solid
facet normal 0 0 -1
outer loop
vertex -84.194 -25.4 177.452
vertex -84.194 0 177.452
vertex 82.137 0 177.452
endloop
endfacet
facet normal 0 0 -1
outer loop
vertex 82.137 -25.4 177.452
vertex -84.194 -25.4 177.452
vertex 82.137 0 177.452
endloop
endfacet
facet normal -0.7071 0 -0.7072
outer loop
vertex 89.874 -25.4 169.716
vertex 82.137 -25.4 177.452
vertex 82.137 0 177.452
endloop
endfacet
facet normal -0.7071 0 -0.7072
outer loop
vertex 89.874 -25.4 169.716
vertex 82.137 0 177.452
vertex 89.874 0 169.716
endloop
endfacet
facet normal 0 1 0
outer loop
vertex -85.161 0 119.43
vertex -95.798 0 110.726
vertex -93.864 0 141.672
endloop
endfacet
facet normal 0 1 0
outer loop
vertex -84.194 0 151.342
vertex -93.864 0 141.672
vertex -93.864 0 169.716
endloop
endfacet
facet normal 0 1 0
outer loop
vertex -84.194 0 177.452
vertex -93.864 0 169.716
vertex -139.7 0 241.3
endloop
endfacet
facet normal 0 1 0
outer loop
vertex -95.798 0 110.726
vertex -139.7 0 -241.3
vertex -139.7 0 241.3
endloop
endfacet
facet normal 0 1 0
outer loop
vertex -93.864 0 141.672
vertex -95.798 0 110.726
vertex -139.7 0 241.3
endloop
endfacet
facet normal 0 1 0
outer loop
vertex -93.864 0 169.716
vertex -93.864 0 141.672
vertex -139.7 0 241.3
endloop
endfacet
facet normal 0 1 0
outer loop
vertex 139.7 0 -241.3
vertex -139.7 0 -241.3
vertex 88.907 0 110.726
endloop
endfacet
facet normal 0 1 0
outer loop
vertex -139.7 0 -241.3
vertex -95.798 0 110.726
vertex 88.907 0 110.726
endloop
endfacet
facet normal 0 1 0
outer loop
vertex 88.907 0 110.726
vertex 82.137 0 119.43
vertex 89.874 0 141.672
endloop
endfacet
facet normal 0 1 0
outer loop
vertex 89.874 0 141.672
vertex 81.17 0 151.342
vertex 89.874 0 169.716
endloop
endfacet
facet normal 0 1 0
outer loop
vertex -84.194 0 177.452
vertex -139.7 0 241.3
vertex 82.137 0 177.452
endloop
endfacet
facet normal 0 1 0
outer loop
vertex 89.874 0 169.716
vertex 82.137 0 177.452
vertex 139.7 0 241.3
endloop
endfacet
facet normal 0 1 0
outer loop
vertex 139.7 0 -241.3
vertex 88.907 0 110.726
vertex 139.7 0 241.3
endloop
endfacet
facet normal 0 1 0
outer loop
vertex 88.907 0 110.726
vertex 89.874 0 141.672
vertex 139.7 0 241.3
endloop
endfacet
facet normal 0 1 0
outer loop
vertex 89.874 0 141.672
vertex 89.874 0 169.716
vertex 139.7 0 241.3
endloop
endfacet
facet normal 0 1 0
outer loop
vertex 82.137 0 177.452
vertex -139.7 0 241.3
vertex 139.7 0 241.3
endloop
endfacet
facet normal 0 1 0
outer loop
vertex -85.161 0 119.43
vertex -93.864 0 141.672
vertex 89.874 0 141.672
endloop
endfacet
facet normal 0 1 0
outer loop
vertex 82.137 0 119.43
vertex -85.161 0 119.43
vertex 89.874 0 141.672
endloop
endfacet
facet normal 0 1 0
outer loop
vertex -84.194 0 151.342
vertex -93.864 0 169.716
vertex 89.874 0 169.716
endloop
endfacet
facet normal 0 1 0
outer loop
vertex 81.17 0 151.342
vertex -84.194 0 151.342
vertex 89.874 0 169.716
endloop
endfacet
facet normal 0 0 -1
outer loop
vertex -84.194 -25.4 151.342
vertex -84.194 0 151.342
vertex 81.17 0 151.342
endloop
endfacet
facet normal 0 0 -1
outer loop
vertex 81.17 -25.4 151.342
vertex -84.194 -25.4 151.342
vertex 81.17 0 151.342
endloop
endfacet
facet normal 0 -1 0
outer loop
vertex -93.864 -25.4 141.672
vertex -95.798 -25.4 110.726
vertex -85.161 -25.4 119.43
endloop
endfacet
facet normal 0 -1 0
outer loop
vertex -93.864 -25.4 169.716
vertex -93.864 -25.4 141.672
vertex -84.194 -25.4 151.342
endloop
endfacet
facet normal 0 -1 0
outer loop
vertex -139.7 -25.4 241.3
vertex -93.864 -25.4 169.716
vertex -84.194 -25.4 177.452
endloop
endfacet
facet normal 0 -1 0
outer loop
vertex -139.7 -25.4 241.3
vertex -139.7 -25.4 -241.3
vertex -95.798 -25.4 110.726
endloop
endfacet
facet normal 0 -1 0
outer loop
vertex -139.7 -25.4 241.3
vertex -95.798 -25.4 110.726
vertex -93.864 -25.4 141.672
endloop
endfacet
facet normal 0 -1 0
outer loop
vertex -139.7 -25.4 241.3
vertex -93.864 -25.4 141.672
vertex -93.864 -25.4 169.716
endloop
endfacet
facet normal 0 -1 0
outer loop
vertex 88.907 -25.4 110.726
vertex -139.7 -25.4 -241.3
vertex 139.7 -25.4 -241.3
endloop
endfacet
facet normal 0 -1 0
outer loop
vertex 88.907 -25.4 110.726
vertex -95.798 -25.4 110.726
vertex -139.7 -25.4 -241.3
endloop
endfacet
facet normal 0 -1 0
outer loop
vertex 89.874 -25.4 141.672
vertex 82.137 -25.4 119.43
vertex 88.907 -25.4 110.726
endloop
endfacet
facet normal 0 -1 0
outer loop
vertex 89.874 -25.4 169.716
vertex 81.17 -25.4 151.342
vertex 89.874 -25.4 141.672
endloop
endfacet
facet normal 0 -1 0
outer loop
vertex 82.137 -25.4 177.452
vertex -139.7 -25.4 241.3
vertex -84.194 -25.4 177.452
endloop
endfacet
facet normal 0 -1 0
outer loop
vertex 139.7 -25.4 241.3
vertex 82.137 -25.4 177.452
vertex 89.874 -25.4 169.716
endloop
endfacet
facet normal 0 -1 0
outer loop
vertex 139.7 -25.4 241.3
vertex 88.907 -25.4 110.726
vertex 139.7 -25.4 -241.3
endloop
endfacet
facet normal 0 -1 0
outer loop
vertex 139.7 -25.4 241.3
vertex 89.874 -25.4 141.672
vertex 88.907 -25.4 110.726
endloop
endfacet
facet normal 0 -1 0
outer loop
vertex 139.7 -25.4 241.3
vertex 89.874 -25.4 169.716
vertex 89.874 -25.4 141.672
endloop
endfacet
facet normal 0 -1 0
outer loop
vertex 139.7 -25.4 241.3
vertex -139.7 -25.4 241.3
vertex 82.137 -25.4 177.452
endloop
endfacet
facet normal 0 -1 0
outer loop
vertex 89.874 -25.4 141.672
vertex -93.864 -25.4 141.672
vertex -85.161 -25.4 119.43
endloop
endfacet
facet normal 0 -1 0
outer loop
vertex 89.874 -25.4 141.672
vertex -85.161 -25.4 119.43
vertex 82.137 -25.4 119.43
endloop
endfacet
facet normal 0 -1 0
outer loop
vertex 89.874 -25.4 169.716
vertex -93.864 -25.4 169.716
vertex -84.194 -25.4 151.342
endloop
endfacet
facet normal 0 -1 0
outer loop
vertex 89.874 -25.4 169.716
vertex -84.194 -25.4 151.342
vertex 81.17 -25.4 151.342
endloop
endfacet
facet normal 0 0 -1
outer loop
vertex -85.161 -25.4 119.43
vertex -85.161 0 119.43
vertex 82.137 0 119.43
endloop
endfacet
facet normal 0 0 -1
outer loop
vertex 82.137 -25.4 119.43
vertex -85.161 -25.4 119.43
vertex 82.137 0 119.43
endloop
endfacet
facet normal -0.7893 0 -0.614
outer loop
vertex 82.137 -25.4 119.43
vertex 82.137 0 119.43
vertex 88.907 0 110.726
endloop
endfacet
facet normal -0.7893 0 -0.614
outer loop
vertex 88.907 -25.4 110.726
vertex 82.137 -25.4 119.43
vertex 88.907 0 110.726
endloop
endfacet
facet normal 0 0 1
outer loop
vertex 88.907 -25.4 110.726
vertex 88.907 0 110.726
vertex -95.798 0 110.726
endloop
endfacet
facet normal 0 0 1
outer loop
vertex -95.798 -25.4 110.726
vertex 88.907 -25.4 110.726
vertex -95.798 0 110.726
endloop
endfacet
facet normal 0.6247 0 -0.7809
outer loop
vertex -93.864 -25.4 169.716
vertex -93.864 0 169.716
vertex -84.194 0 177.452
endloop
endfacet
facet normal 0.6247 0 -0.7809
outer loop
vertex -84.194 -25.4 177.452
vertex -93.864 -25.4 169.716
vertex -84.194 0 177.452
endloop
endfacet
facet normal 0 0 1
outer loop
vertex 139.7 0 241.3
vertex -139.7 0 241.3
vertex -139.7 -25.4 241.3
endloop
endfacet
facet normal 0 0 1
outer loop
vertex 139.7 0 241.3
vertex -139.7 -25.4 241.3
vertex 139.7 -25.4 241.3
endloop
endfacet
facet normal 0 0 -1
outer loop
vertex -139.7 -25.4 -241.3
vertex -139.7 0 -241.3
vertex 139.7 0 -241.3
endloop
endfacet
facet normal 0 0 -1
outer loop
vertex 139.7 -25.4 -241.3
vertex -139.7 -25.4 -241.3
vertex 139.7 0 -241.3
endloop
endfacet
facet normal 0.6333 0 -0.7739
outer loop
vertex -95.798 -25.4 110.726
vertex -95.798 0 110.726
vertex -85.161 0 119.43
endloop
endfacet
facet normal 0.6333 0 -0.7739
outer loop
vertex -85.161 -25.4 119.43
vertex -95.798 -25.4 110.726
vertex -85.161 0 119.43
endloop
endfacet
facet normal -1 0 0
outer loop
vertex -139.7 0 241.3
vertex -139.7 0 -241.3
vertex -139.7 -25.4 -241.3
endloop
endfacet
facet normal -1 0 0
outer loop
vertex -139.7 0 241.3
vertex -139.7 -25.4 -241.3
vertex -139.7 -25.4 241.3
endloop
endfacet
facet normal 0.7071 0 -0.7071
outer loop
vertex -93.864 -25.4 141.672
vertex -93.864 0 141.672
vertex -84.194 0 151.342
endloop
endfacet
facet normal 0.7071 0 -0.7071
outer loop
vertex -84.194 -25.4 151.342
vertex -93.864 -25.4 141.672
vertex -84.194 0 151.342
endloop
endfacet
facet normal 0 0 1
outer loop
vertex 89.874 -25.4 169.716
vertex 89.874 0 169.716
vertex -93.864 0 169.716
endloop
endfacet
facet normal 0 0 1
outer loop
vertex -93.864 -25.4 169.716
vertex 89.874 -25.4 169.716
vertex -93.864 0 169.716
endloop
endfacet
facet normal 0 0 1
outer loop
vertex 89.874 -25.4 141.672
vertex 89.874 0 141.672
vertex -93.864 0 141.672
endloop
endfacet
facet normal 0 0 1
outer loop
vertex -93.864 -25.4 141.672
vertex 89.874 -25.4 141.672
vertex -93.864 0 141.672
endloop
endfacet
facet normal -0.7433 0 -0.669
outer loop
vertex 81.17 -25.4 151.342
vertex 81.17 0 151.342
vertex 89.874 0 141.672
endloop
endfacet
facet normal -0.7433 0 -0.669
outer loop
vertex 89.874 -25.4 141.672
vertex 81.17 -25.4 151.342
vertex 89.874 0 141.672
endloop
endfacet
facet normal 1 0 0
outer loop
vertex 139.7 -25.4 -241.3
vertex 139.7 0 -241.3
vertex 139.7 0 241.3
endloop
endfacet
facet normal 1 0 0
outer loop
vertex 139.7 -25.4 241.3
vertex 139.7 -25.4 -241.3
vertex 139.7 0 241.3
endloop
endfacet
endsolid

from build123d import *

# Parameters (mm, degrees)
F0_W     = 279.4
F0_H     = 482.6
F1_DEPTH = 25.4


with BuildPart() as f1:
    # F0 (on Front) → F1 (new body)
    with BuildSketch(Plane.XZ):
        Rectangle(F0_W, F0_H)
        Polygon((-95.798433, 110.726304), (-85.160971, 119.429685), (82.137294, 119.429685), (88.906586, 110.726304), align=None, mode=Mode.SUBTRACT)
        Polygon((-93.864352, 141.671643), (-84.19393, 151.342079), (81.170253, 151.342079), (89.873627, 141.671643), align=None, mode=Mode.SUBTRACT)
        Polygon((-93.864352, 169.715866), (-84.19393, 177.452207), (82.137294, 177.452207), (89.873627, 169.715866), align=None, mode=Mode.SUBTRACT)
    extrude(amount=F1_DEPTH)


solid = f1.part
